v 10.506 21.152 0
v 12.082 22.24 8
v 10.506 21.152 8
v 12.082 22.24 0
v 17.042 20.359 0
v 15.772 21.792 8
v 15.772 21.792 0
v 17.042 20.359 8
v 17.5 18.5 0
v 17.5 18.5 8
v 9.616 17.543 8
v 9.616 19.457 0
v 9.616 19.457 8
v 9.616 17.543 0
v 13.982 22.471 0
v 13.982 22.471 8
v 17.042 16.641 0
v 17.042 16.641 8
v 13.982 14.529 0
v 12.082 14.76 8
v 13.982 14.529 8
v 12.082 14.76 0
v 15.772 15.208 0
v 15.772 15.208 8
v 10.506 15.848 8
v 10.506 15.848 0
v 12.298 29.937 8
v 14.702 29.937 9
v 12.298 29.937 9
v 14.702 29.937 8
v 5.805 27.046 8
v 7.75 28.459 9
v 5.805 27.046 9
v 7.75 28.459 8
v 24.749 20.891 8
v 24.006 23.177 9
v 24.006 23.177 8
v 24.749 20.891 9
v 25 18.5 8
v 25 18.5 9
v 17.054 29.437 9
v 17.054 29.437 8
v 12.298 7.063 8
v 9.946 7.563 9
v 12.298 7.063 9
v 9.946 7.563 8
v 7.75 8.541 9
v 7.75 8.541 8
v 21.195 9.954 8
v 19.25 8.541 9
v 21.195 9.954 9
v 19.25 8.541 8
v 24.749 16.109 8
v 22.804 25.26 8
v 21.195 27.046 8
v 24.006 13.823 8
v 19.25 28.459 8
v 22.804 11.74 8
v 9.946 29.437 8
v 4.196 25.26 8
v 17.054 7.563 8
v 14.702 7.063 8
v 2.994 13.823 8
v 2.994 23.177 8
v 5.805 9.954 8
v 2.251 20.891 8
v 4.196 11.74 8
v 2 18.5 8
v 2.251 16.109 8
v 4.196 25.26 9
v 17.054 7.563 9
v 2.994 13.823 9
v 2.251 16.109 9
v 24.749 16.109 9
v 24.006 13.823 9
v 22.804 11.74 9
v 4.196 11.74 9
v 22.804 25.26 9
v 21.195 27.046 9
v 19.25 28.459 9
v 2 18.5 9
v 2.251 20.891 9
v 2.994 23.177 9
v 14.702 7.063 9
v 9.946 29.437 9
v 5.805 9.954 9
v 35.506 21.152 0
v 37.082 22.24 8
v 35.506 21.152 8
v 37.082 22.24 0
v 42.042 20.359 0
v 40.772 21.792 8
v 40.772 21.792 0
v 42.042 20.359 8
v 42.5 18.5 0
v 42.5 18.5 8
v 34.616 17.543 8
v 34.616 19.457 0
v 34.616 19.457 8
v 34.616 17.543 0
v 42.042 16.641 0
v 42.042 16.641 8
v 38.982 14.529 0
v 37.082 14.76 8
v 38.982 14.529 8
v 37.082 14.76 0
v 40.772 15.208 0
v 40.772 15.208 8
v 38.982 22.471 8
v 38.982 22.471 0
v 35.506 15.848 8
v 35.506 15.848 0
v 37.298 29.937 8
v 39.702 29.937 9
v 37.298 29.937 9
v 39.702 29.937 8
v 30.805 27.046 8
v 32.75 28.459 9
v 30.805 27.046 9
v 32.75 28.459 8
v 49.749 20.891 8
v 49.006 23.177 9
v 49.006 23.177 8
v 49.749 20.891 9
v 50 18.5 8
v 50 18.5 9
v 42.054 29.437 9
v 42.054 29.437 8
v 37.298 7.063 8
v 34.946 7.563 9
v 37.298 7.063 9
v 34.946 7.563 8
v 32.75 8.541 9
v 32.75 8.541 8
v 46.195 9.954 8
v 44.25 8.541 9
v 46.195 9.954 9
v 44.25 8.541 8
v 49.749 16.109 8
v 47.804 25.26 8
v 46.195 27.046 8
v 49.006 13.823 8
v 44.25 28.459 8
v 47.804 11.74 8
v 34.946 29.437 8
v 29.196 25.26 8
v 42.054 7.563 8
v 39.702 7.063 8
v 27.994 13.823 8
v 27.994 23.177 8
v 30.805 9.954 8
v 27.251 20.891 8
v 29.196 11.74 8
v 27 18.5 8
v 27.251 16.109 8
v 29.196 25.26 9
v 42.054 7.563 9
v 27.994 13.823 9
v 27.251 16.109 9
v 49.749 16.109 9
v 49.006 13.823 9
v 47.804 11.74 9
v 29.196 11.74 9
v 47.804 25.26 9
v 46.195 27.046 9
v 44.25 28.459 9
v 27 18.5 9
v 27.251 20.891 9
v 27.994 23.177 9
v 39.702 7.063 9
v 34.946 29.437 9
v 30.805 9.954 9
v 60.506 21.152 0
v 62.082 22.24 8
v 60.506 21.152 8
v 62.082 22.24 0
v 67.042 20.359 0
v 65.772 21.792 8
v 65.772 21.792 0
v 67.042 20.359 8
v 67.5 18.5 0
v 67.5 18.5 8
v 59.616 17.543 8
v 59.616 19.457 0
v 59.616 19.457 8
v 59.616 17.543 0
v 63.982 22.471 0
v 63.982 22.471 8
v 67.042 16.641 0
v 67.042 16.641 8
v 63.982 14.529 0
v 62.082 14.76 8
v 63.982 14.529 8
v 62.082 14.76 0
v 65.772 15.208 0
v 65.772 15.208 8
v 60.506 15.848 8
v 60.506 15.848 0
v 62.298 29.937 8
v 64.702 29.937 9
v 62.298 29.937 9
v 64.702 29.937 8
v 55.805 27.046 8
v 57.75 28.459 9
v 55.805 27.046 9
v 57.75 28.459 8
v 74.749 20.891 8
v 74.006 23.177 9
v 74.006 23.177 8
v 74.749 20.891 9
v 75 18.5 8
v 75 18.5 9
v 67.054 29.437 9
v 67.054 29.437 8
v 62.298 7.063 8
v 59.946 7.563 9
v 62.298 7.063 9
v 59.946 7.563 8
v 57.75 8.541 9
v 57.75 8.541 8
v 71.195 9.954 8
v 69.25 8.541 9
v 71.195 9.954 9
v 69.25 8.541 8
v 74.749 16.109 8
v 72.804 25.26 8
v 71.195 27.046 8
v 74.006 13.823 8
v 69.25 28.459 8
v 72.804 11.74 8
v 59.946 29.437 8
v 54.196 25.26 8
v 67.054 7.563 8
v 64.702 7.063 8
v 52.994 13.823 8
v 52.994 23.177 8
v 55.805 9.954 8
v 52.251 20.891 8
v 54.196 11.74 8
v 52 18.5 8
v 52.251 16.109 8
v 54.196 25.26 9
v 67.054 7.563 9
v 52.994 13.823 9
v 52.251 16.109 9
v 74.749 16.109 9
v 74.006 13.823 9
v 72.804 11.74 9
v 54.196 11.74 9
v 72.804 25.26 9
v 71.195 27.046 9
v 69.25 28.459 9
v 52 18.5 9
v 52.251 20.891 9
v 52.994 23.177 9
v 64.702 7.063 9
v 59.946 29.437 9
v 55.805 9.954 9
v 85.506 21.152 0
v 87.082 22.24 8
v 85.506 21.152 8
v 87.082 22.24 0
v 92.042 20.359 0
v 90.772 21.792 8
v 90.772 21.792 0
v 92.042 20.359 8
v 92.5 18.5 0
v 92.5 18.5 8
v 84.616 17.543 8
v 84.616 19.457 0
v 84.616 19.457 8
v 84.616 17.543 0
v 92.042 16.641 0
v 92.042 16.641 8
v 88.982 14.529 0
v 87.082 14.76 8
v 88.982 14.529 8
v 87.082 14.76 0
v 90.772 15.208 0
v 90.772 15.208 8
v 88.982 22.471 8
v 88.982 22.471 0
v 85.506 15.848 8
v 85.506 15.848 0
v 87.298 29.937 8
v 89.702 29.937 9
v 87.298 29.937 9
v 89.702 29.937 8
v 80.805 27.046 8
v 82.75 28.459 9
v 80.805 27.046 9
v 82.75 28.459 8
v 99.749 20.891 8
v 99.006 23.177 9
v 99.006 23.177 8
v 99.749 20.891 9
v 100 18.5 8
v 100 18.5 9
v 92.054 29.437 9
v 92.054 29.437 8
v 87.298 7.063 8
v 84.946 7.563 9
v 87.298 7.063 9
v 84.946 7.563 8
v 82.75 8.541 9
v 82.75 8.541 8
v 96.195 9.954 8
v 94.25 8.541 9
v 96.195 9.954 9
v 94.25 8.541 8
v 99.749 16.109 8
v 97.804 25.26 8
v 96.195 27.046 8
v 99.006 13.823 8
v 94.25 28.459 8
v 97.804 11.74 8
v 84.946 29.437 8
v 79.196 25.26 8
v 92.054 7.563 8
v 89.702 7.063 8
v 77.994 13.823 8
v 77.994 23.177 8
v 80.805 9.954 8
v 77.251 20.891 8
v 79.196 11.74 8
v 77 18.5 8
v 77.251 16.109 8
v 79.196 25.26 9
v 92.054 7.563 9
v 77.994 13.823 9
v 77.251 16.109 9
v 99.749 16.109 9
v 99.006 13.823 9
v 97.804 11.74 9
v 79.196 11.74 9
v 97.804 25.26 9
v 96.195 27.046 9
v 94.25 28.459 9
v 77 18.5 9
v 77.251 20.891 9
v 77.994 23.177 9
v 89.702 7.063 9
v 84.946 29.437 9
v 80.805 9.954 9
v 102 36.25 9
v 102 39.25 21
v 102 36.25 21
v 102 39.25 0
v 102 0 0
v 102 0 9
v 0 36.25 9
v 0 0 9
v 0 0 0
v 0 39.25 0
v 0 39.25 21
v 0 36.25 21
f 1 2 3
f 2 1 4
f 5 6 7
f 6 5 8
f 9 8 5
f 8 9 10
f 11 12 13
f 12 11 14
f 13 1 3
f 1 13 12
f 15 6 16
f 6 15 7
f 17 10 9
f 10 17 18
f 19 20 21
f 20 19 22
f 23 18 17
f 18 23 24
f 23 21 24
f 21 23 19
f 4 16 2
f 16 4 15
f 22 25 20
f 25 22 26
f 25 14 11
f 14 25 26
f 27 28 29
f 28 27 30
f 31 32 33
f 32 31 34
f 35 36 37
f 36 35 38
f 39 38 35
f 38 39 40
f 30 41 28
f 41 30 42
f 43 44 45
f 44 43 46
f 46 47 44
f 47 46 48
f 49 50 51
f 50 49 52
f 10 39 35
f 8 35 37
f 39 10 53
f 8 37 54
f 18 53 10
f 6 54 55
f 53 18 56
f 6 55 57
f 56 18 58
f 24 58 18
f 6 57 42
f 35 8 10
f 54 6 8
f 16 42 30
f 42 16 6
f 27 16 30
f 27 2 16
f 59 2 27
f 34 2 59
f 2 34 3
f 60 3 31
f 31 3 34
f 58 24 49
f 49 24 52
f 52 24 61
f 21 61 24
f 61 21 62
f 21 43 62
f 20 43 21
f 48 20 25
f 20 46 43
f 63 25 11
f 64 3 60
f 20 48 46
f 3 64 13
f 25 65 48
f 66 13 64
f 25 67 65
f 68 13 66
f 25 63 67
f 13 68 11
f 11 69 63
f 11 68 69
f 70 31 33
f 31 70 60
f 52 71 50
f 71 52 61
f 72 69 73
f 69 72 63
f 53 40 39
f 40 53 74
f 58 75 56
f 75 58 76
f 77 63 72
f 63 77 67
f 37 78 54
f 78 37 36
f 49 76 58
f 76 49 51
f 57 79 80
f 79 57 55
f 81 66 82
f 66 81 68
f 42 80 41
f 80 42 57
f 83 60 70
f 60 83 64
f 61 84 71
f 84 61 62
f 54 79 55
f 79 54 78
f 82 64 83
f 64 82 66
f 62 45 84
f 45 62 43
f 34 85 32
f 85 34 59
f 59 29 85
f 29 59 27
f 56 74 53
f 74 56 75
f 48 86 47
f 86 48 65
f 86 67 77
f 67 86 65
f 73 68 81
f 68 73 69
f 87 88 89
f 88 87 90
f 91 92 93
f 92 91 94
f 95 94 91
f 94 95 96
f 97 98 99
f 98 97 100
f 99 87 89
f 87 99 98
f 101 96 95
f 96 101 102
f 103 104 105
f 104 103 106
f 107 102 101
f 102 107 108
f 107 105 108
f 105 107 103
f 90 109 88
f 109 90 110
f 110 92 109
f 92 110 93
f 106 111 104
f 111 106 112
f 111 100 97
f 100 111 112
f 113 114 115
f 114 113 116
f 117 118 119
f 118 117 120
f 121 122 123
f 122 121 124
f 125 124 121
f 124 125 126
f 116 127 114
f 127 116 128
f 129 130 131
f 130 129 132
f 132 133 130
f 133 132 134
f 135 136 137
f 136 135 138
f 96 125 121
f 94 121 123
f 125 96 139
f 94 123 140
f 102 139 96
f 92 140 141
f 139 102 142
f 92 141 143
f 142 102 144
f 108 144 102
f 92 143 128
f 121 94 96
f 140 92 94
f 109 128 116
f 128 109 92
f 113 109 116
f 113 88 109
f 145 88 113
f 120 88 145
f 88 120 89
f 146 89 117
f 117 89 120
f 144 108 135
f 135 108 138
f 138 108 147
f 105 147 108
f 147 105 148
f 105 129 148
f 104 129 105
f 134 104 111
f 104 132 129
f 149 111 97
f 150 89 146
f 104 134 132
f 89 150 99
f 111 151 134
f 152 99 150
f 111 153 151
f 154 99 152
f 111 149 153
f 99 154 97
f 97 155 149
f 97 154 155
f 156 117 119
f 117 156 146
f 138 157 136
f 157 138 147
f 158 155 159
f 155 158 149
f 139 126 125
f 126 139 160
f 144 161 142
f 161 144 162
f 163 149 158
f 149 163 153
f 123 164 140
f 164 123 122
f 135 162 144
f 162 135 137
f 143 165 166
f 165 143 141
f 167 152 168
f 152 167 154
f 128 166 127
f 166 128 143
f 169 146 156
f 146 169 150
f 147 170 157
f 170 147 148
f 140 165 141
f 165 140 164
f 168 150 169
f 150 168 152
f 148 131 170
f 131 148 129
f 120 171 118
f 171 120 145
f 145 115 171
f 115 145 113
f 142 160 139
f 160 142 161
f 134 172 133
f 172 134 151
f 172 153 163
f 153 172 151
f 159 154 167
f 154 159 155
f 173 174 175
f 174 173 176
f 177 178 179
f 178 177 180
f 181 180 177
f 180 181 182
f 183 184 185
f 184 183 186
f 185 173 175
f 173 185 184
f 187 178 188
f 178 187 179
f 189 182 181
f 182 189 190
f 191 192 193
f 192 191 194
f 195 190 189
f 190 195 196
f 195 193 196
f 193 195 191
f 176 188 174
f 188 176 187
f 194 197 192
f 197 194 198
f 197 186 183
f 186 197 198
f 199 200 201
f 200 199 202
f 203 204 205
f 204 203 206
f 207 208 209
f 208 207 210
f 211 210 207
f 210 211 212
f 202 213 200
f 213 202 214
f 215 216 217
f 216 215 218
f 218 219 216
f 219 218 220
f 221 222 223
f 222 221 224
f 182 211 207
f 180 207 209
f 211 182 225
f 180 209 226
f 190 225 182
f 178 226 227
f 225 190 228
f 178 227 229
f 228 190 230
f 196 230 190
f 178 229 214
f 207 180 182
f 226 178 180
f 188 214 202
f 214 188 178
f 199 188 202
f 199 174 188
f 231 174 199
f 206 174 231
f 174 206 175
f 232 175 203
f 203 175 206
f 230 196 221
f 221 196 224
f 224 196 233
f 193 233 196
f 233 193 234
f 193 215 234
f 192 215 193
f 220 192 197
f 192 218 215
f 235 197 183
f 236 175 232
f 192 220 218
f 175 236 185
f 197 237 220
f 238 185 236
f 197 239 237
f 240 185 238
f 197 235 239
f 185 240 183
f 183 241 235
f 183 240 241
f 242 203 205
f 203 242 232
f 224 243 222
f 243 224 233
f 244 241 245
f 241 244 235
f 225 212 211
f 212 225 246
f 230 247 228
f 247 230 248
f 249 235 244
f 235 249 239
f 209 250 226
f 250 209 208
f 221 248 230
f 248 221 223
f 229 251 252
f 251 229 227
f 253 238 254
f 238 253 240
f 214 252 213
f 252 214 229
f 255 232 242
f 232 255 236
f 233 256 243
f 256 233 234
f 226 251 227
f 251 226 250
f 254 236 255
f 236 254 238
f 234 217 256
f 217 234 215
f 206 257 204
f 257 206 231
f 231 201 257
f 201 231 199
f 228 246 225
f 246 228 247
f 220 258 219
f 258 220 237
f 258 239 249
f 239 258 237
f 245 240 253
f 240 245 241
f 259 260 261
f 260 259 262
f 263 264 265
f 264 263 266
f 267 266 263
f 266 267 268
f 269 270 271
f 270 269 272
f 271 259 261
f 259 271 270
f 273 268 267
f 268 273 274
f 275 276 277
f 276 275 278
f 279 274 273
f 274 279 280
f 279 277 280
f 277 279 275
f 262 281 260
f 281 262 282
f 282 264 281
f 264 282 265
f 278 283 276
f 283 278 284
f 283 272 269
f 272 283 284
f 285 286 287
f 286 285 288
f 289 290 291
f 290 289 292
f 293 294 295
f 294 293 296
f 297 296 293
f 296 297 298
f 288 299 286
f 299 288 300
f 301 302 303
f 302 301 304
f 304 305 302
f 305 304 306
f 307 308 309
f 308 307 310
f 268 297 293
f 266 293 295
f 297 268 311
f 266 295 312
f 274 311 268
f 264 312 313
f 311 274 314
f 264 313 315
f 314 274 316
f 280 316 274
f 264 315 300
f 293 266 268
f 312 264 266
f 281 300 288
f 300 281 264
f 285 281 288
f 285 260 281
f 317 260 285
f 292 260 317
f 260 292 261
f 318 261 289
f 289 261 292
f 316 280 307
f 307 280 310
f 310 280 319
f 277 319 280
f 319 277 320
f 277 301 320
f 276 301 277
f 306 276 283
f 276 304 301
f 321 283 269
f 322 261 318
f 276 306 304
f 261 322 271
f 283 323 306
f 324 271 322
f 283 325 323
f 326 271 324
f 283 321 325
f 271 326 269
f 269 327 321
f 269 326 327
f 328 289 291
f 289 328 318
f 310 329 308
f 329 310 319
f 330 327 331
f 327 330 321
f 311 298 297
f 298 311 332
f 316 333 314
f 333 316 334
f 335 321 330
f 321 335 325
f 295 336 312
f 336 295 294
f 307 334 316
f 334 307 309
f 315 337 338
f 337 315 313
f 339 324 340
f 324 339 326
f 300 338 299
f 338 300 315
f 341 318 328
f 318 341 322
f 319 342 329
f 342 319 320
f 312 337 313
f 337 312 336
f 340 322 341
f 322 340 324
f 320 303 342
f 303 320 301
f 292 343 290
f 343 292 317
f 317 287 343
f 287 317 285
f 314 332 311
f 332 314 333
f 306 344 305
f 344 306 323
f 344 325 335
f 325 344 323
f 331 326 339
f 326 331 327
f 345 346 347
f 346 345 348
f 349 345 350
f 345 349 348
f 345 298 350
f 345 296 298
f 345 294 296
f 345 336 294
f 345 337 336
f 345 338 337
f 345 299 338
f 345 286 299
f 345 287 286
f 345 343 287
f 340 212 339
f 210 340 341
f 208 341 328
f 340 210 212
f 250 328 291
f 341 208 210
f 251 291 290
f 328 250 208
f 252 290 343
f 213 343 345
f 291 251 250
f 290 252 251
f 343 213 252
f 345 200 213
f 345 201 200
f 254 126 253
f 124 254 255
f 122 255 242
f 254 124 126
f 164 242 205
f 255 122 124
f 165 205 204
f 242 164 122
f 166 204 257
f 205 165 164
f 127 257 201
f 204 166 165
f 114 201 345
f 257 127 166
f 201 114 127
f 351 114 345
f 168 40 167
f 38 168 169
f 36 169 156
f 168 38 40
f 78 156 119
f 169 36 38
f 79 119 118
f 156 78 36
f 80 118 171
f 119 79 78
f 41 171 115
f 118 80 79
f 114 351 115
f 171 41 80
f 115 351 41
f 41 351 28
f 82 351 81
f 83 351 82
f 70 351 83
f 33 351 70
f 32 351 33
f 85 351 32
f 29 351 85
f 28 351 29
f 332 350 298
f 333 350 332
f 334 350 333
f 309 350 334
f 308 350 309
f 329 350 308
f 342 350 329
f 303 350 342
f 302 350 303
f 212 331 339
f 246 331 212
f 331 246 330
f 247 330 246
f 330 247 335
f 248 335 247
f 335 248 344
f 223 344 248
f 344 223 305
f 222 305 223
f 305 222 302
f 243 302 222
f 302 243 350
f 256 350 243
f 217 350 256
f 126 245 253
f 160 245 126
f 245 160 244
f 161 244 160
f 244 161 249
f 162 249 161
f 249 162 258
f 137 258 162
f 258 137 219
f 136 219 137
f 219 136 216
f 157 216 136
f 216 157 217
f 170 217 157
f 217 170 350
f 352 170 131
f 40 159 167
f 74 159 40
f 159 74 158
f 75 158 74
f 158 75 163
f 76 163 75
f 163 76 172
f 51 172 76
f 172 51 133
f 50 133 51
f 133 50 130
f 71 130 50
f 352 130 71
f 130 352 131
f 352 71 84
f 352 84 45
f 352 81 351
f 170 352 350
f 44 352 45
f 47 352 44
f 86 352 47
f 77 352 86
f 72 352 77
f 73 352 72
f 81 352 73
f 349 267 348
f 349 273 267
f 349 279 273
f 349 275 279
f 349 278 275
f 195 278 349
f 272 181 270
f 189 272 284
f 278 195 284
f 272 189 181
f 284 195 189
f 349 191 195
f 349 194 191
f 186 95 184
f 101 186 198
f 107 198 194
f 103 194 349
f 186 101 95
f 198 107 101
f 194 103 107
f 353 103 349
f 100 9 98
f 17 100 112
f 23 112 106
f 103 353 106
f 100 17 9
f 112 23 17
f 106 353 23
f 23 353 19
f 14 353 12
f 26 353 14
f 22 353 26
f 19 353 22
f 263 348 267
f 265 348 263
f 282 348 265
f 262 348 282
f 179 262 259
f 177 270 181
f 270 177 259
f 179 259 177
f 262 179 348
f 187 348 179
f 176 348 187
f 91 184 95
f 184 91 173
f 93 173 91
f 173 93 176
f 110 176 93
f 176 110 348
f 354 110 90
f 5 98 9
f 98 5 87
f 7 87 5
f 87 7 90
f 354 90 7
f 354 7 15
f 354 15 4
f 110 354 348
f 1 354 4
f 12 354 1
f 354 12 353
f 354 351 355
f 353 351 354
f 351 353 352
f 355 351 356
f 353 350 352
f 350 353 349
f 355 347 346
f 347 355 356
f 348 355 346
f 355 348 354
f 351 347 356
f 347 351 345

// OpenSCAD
support_thickness = 6;
atomizer_hole = 8;
atomizer_size = 23;
atomizer_dist = 2;
atomizer_number = 4;

support_x = (atomizer_size * atomizer_number) + (atomizer_dist * (atomizer_number - 1)) + atomizer_dist * 2;
support_y = atomizer_size + atomizer_dist + support_thickness * 2;
support_z = support_thickness * 1.5;

support_hole_y = support_y - support_thickness * 2;
support_hole_x = support_x - support_thickness * 2;

hole_distance = atomizer_size/2+atomizer_dist;
atomizer_distance = atomizer_size+atomizer_dist;

union() {
    translate([0, support_y-support_thickness/8, 0])
        cube([support_x, support_thickness/2, support_z + support_thickness * 2]);

    difference() {
        cube([support_x, support_y, support_z]);
        // translate([-5, support_thickness, support_thickness])
        //     cube([support_hole_x+20, support_hole_y, support_hole_y]);
        union() {
            for(hole = [0:atomizer_number-1]) {
                translate([hole_distance+(atomizer_distance*hole), support_y/2, -2])
                    cylinder(h=support_thickness*2.5, r=atomizer_hole/2);
                translate([hole_distance+(atomizer_distance*hole), support_y/2, support_z-1])
                    cylinder(h=4, r=atomizer_size/2);
            }
        }
    }
}
